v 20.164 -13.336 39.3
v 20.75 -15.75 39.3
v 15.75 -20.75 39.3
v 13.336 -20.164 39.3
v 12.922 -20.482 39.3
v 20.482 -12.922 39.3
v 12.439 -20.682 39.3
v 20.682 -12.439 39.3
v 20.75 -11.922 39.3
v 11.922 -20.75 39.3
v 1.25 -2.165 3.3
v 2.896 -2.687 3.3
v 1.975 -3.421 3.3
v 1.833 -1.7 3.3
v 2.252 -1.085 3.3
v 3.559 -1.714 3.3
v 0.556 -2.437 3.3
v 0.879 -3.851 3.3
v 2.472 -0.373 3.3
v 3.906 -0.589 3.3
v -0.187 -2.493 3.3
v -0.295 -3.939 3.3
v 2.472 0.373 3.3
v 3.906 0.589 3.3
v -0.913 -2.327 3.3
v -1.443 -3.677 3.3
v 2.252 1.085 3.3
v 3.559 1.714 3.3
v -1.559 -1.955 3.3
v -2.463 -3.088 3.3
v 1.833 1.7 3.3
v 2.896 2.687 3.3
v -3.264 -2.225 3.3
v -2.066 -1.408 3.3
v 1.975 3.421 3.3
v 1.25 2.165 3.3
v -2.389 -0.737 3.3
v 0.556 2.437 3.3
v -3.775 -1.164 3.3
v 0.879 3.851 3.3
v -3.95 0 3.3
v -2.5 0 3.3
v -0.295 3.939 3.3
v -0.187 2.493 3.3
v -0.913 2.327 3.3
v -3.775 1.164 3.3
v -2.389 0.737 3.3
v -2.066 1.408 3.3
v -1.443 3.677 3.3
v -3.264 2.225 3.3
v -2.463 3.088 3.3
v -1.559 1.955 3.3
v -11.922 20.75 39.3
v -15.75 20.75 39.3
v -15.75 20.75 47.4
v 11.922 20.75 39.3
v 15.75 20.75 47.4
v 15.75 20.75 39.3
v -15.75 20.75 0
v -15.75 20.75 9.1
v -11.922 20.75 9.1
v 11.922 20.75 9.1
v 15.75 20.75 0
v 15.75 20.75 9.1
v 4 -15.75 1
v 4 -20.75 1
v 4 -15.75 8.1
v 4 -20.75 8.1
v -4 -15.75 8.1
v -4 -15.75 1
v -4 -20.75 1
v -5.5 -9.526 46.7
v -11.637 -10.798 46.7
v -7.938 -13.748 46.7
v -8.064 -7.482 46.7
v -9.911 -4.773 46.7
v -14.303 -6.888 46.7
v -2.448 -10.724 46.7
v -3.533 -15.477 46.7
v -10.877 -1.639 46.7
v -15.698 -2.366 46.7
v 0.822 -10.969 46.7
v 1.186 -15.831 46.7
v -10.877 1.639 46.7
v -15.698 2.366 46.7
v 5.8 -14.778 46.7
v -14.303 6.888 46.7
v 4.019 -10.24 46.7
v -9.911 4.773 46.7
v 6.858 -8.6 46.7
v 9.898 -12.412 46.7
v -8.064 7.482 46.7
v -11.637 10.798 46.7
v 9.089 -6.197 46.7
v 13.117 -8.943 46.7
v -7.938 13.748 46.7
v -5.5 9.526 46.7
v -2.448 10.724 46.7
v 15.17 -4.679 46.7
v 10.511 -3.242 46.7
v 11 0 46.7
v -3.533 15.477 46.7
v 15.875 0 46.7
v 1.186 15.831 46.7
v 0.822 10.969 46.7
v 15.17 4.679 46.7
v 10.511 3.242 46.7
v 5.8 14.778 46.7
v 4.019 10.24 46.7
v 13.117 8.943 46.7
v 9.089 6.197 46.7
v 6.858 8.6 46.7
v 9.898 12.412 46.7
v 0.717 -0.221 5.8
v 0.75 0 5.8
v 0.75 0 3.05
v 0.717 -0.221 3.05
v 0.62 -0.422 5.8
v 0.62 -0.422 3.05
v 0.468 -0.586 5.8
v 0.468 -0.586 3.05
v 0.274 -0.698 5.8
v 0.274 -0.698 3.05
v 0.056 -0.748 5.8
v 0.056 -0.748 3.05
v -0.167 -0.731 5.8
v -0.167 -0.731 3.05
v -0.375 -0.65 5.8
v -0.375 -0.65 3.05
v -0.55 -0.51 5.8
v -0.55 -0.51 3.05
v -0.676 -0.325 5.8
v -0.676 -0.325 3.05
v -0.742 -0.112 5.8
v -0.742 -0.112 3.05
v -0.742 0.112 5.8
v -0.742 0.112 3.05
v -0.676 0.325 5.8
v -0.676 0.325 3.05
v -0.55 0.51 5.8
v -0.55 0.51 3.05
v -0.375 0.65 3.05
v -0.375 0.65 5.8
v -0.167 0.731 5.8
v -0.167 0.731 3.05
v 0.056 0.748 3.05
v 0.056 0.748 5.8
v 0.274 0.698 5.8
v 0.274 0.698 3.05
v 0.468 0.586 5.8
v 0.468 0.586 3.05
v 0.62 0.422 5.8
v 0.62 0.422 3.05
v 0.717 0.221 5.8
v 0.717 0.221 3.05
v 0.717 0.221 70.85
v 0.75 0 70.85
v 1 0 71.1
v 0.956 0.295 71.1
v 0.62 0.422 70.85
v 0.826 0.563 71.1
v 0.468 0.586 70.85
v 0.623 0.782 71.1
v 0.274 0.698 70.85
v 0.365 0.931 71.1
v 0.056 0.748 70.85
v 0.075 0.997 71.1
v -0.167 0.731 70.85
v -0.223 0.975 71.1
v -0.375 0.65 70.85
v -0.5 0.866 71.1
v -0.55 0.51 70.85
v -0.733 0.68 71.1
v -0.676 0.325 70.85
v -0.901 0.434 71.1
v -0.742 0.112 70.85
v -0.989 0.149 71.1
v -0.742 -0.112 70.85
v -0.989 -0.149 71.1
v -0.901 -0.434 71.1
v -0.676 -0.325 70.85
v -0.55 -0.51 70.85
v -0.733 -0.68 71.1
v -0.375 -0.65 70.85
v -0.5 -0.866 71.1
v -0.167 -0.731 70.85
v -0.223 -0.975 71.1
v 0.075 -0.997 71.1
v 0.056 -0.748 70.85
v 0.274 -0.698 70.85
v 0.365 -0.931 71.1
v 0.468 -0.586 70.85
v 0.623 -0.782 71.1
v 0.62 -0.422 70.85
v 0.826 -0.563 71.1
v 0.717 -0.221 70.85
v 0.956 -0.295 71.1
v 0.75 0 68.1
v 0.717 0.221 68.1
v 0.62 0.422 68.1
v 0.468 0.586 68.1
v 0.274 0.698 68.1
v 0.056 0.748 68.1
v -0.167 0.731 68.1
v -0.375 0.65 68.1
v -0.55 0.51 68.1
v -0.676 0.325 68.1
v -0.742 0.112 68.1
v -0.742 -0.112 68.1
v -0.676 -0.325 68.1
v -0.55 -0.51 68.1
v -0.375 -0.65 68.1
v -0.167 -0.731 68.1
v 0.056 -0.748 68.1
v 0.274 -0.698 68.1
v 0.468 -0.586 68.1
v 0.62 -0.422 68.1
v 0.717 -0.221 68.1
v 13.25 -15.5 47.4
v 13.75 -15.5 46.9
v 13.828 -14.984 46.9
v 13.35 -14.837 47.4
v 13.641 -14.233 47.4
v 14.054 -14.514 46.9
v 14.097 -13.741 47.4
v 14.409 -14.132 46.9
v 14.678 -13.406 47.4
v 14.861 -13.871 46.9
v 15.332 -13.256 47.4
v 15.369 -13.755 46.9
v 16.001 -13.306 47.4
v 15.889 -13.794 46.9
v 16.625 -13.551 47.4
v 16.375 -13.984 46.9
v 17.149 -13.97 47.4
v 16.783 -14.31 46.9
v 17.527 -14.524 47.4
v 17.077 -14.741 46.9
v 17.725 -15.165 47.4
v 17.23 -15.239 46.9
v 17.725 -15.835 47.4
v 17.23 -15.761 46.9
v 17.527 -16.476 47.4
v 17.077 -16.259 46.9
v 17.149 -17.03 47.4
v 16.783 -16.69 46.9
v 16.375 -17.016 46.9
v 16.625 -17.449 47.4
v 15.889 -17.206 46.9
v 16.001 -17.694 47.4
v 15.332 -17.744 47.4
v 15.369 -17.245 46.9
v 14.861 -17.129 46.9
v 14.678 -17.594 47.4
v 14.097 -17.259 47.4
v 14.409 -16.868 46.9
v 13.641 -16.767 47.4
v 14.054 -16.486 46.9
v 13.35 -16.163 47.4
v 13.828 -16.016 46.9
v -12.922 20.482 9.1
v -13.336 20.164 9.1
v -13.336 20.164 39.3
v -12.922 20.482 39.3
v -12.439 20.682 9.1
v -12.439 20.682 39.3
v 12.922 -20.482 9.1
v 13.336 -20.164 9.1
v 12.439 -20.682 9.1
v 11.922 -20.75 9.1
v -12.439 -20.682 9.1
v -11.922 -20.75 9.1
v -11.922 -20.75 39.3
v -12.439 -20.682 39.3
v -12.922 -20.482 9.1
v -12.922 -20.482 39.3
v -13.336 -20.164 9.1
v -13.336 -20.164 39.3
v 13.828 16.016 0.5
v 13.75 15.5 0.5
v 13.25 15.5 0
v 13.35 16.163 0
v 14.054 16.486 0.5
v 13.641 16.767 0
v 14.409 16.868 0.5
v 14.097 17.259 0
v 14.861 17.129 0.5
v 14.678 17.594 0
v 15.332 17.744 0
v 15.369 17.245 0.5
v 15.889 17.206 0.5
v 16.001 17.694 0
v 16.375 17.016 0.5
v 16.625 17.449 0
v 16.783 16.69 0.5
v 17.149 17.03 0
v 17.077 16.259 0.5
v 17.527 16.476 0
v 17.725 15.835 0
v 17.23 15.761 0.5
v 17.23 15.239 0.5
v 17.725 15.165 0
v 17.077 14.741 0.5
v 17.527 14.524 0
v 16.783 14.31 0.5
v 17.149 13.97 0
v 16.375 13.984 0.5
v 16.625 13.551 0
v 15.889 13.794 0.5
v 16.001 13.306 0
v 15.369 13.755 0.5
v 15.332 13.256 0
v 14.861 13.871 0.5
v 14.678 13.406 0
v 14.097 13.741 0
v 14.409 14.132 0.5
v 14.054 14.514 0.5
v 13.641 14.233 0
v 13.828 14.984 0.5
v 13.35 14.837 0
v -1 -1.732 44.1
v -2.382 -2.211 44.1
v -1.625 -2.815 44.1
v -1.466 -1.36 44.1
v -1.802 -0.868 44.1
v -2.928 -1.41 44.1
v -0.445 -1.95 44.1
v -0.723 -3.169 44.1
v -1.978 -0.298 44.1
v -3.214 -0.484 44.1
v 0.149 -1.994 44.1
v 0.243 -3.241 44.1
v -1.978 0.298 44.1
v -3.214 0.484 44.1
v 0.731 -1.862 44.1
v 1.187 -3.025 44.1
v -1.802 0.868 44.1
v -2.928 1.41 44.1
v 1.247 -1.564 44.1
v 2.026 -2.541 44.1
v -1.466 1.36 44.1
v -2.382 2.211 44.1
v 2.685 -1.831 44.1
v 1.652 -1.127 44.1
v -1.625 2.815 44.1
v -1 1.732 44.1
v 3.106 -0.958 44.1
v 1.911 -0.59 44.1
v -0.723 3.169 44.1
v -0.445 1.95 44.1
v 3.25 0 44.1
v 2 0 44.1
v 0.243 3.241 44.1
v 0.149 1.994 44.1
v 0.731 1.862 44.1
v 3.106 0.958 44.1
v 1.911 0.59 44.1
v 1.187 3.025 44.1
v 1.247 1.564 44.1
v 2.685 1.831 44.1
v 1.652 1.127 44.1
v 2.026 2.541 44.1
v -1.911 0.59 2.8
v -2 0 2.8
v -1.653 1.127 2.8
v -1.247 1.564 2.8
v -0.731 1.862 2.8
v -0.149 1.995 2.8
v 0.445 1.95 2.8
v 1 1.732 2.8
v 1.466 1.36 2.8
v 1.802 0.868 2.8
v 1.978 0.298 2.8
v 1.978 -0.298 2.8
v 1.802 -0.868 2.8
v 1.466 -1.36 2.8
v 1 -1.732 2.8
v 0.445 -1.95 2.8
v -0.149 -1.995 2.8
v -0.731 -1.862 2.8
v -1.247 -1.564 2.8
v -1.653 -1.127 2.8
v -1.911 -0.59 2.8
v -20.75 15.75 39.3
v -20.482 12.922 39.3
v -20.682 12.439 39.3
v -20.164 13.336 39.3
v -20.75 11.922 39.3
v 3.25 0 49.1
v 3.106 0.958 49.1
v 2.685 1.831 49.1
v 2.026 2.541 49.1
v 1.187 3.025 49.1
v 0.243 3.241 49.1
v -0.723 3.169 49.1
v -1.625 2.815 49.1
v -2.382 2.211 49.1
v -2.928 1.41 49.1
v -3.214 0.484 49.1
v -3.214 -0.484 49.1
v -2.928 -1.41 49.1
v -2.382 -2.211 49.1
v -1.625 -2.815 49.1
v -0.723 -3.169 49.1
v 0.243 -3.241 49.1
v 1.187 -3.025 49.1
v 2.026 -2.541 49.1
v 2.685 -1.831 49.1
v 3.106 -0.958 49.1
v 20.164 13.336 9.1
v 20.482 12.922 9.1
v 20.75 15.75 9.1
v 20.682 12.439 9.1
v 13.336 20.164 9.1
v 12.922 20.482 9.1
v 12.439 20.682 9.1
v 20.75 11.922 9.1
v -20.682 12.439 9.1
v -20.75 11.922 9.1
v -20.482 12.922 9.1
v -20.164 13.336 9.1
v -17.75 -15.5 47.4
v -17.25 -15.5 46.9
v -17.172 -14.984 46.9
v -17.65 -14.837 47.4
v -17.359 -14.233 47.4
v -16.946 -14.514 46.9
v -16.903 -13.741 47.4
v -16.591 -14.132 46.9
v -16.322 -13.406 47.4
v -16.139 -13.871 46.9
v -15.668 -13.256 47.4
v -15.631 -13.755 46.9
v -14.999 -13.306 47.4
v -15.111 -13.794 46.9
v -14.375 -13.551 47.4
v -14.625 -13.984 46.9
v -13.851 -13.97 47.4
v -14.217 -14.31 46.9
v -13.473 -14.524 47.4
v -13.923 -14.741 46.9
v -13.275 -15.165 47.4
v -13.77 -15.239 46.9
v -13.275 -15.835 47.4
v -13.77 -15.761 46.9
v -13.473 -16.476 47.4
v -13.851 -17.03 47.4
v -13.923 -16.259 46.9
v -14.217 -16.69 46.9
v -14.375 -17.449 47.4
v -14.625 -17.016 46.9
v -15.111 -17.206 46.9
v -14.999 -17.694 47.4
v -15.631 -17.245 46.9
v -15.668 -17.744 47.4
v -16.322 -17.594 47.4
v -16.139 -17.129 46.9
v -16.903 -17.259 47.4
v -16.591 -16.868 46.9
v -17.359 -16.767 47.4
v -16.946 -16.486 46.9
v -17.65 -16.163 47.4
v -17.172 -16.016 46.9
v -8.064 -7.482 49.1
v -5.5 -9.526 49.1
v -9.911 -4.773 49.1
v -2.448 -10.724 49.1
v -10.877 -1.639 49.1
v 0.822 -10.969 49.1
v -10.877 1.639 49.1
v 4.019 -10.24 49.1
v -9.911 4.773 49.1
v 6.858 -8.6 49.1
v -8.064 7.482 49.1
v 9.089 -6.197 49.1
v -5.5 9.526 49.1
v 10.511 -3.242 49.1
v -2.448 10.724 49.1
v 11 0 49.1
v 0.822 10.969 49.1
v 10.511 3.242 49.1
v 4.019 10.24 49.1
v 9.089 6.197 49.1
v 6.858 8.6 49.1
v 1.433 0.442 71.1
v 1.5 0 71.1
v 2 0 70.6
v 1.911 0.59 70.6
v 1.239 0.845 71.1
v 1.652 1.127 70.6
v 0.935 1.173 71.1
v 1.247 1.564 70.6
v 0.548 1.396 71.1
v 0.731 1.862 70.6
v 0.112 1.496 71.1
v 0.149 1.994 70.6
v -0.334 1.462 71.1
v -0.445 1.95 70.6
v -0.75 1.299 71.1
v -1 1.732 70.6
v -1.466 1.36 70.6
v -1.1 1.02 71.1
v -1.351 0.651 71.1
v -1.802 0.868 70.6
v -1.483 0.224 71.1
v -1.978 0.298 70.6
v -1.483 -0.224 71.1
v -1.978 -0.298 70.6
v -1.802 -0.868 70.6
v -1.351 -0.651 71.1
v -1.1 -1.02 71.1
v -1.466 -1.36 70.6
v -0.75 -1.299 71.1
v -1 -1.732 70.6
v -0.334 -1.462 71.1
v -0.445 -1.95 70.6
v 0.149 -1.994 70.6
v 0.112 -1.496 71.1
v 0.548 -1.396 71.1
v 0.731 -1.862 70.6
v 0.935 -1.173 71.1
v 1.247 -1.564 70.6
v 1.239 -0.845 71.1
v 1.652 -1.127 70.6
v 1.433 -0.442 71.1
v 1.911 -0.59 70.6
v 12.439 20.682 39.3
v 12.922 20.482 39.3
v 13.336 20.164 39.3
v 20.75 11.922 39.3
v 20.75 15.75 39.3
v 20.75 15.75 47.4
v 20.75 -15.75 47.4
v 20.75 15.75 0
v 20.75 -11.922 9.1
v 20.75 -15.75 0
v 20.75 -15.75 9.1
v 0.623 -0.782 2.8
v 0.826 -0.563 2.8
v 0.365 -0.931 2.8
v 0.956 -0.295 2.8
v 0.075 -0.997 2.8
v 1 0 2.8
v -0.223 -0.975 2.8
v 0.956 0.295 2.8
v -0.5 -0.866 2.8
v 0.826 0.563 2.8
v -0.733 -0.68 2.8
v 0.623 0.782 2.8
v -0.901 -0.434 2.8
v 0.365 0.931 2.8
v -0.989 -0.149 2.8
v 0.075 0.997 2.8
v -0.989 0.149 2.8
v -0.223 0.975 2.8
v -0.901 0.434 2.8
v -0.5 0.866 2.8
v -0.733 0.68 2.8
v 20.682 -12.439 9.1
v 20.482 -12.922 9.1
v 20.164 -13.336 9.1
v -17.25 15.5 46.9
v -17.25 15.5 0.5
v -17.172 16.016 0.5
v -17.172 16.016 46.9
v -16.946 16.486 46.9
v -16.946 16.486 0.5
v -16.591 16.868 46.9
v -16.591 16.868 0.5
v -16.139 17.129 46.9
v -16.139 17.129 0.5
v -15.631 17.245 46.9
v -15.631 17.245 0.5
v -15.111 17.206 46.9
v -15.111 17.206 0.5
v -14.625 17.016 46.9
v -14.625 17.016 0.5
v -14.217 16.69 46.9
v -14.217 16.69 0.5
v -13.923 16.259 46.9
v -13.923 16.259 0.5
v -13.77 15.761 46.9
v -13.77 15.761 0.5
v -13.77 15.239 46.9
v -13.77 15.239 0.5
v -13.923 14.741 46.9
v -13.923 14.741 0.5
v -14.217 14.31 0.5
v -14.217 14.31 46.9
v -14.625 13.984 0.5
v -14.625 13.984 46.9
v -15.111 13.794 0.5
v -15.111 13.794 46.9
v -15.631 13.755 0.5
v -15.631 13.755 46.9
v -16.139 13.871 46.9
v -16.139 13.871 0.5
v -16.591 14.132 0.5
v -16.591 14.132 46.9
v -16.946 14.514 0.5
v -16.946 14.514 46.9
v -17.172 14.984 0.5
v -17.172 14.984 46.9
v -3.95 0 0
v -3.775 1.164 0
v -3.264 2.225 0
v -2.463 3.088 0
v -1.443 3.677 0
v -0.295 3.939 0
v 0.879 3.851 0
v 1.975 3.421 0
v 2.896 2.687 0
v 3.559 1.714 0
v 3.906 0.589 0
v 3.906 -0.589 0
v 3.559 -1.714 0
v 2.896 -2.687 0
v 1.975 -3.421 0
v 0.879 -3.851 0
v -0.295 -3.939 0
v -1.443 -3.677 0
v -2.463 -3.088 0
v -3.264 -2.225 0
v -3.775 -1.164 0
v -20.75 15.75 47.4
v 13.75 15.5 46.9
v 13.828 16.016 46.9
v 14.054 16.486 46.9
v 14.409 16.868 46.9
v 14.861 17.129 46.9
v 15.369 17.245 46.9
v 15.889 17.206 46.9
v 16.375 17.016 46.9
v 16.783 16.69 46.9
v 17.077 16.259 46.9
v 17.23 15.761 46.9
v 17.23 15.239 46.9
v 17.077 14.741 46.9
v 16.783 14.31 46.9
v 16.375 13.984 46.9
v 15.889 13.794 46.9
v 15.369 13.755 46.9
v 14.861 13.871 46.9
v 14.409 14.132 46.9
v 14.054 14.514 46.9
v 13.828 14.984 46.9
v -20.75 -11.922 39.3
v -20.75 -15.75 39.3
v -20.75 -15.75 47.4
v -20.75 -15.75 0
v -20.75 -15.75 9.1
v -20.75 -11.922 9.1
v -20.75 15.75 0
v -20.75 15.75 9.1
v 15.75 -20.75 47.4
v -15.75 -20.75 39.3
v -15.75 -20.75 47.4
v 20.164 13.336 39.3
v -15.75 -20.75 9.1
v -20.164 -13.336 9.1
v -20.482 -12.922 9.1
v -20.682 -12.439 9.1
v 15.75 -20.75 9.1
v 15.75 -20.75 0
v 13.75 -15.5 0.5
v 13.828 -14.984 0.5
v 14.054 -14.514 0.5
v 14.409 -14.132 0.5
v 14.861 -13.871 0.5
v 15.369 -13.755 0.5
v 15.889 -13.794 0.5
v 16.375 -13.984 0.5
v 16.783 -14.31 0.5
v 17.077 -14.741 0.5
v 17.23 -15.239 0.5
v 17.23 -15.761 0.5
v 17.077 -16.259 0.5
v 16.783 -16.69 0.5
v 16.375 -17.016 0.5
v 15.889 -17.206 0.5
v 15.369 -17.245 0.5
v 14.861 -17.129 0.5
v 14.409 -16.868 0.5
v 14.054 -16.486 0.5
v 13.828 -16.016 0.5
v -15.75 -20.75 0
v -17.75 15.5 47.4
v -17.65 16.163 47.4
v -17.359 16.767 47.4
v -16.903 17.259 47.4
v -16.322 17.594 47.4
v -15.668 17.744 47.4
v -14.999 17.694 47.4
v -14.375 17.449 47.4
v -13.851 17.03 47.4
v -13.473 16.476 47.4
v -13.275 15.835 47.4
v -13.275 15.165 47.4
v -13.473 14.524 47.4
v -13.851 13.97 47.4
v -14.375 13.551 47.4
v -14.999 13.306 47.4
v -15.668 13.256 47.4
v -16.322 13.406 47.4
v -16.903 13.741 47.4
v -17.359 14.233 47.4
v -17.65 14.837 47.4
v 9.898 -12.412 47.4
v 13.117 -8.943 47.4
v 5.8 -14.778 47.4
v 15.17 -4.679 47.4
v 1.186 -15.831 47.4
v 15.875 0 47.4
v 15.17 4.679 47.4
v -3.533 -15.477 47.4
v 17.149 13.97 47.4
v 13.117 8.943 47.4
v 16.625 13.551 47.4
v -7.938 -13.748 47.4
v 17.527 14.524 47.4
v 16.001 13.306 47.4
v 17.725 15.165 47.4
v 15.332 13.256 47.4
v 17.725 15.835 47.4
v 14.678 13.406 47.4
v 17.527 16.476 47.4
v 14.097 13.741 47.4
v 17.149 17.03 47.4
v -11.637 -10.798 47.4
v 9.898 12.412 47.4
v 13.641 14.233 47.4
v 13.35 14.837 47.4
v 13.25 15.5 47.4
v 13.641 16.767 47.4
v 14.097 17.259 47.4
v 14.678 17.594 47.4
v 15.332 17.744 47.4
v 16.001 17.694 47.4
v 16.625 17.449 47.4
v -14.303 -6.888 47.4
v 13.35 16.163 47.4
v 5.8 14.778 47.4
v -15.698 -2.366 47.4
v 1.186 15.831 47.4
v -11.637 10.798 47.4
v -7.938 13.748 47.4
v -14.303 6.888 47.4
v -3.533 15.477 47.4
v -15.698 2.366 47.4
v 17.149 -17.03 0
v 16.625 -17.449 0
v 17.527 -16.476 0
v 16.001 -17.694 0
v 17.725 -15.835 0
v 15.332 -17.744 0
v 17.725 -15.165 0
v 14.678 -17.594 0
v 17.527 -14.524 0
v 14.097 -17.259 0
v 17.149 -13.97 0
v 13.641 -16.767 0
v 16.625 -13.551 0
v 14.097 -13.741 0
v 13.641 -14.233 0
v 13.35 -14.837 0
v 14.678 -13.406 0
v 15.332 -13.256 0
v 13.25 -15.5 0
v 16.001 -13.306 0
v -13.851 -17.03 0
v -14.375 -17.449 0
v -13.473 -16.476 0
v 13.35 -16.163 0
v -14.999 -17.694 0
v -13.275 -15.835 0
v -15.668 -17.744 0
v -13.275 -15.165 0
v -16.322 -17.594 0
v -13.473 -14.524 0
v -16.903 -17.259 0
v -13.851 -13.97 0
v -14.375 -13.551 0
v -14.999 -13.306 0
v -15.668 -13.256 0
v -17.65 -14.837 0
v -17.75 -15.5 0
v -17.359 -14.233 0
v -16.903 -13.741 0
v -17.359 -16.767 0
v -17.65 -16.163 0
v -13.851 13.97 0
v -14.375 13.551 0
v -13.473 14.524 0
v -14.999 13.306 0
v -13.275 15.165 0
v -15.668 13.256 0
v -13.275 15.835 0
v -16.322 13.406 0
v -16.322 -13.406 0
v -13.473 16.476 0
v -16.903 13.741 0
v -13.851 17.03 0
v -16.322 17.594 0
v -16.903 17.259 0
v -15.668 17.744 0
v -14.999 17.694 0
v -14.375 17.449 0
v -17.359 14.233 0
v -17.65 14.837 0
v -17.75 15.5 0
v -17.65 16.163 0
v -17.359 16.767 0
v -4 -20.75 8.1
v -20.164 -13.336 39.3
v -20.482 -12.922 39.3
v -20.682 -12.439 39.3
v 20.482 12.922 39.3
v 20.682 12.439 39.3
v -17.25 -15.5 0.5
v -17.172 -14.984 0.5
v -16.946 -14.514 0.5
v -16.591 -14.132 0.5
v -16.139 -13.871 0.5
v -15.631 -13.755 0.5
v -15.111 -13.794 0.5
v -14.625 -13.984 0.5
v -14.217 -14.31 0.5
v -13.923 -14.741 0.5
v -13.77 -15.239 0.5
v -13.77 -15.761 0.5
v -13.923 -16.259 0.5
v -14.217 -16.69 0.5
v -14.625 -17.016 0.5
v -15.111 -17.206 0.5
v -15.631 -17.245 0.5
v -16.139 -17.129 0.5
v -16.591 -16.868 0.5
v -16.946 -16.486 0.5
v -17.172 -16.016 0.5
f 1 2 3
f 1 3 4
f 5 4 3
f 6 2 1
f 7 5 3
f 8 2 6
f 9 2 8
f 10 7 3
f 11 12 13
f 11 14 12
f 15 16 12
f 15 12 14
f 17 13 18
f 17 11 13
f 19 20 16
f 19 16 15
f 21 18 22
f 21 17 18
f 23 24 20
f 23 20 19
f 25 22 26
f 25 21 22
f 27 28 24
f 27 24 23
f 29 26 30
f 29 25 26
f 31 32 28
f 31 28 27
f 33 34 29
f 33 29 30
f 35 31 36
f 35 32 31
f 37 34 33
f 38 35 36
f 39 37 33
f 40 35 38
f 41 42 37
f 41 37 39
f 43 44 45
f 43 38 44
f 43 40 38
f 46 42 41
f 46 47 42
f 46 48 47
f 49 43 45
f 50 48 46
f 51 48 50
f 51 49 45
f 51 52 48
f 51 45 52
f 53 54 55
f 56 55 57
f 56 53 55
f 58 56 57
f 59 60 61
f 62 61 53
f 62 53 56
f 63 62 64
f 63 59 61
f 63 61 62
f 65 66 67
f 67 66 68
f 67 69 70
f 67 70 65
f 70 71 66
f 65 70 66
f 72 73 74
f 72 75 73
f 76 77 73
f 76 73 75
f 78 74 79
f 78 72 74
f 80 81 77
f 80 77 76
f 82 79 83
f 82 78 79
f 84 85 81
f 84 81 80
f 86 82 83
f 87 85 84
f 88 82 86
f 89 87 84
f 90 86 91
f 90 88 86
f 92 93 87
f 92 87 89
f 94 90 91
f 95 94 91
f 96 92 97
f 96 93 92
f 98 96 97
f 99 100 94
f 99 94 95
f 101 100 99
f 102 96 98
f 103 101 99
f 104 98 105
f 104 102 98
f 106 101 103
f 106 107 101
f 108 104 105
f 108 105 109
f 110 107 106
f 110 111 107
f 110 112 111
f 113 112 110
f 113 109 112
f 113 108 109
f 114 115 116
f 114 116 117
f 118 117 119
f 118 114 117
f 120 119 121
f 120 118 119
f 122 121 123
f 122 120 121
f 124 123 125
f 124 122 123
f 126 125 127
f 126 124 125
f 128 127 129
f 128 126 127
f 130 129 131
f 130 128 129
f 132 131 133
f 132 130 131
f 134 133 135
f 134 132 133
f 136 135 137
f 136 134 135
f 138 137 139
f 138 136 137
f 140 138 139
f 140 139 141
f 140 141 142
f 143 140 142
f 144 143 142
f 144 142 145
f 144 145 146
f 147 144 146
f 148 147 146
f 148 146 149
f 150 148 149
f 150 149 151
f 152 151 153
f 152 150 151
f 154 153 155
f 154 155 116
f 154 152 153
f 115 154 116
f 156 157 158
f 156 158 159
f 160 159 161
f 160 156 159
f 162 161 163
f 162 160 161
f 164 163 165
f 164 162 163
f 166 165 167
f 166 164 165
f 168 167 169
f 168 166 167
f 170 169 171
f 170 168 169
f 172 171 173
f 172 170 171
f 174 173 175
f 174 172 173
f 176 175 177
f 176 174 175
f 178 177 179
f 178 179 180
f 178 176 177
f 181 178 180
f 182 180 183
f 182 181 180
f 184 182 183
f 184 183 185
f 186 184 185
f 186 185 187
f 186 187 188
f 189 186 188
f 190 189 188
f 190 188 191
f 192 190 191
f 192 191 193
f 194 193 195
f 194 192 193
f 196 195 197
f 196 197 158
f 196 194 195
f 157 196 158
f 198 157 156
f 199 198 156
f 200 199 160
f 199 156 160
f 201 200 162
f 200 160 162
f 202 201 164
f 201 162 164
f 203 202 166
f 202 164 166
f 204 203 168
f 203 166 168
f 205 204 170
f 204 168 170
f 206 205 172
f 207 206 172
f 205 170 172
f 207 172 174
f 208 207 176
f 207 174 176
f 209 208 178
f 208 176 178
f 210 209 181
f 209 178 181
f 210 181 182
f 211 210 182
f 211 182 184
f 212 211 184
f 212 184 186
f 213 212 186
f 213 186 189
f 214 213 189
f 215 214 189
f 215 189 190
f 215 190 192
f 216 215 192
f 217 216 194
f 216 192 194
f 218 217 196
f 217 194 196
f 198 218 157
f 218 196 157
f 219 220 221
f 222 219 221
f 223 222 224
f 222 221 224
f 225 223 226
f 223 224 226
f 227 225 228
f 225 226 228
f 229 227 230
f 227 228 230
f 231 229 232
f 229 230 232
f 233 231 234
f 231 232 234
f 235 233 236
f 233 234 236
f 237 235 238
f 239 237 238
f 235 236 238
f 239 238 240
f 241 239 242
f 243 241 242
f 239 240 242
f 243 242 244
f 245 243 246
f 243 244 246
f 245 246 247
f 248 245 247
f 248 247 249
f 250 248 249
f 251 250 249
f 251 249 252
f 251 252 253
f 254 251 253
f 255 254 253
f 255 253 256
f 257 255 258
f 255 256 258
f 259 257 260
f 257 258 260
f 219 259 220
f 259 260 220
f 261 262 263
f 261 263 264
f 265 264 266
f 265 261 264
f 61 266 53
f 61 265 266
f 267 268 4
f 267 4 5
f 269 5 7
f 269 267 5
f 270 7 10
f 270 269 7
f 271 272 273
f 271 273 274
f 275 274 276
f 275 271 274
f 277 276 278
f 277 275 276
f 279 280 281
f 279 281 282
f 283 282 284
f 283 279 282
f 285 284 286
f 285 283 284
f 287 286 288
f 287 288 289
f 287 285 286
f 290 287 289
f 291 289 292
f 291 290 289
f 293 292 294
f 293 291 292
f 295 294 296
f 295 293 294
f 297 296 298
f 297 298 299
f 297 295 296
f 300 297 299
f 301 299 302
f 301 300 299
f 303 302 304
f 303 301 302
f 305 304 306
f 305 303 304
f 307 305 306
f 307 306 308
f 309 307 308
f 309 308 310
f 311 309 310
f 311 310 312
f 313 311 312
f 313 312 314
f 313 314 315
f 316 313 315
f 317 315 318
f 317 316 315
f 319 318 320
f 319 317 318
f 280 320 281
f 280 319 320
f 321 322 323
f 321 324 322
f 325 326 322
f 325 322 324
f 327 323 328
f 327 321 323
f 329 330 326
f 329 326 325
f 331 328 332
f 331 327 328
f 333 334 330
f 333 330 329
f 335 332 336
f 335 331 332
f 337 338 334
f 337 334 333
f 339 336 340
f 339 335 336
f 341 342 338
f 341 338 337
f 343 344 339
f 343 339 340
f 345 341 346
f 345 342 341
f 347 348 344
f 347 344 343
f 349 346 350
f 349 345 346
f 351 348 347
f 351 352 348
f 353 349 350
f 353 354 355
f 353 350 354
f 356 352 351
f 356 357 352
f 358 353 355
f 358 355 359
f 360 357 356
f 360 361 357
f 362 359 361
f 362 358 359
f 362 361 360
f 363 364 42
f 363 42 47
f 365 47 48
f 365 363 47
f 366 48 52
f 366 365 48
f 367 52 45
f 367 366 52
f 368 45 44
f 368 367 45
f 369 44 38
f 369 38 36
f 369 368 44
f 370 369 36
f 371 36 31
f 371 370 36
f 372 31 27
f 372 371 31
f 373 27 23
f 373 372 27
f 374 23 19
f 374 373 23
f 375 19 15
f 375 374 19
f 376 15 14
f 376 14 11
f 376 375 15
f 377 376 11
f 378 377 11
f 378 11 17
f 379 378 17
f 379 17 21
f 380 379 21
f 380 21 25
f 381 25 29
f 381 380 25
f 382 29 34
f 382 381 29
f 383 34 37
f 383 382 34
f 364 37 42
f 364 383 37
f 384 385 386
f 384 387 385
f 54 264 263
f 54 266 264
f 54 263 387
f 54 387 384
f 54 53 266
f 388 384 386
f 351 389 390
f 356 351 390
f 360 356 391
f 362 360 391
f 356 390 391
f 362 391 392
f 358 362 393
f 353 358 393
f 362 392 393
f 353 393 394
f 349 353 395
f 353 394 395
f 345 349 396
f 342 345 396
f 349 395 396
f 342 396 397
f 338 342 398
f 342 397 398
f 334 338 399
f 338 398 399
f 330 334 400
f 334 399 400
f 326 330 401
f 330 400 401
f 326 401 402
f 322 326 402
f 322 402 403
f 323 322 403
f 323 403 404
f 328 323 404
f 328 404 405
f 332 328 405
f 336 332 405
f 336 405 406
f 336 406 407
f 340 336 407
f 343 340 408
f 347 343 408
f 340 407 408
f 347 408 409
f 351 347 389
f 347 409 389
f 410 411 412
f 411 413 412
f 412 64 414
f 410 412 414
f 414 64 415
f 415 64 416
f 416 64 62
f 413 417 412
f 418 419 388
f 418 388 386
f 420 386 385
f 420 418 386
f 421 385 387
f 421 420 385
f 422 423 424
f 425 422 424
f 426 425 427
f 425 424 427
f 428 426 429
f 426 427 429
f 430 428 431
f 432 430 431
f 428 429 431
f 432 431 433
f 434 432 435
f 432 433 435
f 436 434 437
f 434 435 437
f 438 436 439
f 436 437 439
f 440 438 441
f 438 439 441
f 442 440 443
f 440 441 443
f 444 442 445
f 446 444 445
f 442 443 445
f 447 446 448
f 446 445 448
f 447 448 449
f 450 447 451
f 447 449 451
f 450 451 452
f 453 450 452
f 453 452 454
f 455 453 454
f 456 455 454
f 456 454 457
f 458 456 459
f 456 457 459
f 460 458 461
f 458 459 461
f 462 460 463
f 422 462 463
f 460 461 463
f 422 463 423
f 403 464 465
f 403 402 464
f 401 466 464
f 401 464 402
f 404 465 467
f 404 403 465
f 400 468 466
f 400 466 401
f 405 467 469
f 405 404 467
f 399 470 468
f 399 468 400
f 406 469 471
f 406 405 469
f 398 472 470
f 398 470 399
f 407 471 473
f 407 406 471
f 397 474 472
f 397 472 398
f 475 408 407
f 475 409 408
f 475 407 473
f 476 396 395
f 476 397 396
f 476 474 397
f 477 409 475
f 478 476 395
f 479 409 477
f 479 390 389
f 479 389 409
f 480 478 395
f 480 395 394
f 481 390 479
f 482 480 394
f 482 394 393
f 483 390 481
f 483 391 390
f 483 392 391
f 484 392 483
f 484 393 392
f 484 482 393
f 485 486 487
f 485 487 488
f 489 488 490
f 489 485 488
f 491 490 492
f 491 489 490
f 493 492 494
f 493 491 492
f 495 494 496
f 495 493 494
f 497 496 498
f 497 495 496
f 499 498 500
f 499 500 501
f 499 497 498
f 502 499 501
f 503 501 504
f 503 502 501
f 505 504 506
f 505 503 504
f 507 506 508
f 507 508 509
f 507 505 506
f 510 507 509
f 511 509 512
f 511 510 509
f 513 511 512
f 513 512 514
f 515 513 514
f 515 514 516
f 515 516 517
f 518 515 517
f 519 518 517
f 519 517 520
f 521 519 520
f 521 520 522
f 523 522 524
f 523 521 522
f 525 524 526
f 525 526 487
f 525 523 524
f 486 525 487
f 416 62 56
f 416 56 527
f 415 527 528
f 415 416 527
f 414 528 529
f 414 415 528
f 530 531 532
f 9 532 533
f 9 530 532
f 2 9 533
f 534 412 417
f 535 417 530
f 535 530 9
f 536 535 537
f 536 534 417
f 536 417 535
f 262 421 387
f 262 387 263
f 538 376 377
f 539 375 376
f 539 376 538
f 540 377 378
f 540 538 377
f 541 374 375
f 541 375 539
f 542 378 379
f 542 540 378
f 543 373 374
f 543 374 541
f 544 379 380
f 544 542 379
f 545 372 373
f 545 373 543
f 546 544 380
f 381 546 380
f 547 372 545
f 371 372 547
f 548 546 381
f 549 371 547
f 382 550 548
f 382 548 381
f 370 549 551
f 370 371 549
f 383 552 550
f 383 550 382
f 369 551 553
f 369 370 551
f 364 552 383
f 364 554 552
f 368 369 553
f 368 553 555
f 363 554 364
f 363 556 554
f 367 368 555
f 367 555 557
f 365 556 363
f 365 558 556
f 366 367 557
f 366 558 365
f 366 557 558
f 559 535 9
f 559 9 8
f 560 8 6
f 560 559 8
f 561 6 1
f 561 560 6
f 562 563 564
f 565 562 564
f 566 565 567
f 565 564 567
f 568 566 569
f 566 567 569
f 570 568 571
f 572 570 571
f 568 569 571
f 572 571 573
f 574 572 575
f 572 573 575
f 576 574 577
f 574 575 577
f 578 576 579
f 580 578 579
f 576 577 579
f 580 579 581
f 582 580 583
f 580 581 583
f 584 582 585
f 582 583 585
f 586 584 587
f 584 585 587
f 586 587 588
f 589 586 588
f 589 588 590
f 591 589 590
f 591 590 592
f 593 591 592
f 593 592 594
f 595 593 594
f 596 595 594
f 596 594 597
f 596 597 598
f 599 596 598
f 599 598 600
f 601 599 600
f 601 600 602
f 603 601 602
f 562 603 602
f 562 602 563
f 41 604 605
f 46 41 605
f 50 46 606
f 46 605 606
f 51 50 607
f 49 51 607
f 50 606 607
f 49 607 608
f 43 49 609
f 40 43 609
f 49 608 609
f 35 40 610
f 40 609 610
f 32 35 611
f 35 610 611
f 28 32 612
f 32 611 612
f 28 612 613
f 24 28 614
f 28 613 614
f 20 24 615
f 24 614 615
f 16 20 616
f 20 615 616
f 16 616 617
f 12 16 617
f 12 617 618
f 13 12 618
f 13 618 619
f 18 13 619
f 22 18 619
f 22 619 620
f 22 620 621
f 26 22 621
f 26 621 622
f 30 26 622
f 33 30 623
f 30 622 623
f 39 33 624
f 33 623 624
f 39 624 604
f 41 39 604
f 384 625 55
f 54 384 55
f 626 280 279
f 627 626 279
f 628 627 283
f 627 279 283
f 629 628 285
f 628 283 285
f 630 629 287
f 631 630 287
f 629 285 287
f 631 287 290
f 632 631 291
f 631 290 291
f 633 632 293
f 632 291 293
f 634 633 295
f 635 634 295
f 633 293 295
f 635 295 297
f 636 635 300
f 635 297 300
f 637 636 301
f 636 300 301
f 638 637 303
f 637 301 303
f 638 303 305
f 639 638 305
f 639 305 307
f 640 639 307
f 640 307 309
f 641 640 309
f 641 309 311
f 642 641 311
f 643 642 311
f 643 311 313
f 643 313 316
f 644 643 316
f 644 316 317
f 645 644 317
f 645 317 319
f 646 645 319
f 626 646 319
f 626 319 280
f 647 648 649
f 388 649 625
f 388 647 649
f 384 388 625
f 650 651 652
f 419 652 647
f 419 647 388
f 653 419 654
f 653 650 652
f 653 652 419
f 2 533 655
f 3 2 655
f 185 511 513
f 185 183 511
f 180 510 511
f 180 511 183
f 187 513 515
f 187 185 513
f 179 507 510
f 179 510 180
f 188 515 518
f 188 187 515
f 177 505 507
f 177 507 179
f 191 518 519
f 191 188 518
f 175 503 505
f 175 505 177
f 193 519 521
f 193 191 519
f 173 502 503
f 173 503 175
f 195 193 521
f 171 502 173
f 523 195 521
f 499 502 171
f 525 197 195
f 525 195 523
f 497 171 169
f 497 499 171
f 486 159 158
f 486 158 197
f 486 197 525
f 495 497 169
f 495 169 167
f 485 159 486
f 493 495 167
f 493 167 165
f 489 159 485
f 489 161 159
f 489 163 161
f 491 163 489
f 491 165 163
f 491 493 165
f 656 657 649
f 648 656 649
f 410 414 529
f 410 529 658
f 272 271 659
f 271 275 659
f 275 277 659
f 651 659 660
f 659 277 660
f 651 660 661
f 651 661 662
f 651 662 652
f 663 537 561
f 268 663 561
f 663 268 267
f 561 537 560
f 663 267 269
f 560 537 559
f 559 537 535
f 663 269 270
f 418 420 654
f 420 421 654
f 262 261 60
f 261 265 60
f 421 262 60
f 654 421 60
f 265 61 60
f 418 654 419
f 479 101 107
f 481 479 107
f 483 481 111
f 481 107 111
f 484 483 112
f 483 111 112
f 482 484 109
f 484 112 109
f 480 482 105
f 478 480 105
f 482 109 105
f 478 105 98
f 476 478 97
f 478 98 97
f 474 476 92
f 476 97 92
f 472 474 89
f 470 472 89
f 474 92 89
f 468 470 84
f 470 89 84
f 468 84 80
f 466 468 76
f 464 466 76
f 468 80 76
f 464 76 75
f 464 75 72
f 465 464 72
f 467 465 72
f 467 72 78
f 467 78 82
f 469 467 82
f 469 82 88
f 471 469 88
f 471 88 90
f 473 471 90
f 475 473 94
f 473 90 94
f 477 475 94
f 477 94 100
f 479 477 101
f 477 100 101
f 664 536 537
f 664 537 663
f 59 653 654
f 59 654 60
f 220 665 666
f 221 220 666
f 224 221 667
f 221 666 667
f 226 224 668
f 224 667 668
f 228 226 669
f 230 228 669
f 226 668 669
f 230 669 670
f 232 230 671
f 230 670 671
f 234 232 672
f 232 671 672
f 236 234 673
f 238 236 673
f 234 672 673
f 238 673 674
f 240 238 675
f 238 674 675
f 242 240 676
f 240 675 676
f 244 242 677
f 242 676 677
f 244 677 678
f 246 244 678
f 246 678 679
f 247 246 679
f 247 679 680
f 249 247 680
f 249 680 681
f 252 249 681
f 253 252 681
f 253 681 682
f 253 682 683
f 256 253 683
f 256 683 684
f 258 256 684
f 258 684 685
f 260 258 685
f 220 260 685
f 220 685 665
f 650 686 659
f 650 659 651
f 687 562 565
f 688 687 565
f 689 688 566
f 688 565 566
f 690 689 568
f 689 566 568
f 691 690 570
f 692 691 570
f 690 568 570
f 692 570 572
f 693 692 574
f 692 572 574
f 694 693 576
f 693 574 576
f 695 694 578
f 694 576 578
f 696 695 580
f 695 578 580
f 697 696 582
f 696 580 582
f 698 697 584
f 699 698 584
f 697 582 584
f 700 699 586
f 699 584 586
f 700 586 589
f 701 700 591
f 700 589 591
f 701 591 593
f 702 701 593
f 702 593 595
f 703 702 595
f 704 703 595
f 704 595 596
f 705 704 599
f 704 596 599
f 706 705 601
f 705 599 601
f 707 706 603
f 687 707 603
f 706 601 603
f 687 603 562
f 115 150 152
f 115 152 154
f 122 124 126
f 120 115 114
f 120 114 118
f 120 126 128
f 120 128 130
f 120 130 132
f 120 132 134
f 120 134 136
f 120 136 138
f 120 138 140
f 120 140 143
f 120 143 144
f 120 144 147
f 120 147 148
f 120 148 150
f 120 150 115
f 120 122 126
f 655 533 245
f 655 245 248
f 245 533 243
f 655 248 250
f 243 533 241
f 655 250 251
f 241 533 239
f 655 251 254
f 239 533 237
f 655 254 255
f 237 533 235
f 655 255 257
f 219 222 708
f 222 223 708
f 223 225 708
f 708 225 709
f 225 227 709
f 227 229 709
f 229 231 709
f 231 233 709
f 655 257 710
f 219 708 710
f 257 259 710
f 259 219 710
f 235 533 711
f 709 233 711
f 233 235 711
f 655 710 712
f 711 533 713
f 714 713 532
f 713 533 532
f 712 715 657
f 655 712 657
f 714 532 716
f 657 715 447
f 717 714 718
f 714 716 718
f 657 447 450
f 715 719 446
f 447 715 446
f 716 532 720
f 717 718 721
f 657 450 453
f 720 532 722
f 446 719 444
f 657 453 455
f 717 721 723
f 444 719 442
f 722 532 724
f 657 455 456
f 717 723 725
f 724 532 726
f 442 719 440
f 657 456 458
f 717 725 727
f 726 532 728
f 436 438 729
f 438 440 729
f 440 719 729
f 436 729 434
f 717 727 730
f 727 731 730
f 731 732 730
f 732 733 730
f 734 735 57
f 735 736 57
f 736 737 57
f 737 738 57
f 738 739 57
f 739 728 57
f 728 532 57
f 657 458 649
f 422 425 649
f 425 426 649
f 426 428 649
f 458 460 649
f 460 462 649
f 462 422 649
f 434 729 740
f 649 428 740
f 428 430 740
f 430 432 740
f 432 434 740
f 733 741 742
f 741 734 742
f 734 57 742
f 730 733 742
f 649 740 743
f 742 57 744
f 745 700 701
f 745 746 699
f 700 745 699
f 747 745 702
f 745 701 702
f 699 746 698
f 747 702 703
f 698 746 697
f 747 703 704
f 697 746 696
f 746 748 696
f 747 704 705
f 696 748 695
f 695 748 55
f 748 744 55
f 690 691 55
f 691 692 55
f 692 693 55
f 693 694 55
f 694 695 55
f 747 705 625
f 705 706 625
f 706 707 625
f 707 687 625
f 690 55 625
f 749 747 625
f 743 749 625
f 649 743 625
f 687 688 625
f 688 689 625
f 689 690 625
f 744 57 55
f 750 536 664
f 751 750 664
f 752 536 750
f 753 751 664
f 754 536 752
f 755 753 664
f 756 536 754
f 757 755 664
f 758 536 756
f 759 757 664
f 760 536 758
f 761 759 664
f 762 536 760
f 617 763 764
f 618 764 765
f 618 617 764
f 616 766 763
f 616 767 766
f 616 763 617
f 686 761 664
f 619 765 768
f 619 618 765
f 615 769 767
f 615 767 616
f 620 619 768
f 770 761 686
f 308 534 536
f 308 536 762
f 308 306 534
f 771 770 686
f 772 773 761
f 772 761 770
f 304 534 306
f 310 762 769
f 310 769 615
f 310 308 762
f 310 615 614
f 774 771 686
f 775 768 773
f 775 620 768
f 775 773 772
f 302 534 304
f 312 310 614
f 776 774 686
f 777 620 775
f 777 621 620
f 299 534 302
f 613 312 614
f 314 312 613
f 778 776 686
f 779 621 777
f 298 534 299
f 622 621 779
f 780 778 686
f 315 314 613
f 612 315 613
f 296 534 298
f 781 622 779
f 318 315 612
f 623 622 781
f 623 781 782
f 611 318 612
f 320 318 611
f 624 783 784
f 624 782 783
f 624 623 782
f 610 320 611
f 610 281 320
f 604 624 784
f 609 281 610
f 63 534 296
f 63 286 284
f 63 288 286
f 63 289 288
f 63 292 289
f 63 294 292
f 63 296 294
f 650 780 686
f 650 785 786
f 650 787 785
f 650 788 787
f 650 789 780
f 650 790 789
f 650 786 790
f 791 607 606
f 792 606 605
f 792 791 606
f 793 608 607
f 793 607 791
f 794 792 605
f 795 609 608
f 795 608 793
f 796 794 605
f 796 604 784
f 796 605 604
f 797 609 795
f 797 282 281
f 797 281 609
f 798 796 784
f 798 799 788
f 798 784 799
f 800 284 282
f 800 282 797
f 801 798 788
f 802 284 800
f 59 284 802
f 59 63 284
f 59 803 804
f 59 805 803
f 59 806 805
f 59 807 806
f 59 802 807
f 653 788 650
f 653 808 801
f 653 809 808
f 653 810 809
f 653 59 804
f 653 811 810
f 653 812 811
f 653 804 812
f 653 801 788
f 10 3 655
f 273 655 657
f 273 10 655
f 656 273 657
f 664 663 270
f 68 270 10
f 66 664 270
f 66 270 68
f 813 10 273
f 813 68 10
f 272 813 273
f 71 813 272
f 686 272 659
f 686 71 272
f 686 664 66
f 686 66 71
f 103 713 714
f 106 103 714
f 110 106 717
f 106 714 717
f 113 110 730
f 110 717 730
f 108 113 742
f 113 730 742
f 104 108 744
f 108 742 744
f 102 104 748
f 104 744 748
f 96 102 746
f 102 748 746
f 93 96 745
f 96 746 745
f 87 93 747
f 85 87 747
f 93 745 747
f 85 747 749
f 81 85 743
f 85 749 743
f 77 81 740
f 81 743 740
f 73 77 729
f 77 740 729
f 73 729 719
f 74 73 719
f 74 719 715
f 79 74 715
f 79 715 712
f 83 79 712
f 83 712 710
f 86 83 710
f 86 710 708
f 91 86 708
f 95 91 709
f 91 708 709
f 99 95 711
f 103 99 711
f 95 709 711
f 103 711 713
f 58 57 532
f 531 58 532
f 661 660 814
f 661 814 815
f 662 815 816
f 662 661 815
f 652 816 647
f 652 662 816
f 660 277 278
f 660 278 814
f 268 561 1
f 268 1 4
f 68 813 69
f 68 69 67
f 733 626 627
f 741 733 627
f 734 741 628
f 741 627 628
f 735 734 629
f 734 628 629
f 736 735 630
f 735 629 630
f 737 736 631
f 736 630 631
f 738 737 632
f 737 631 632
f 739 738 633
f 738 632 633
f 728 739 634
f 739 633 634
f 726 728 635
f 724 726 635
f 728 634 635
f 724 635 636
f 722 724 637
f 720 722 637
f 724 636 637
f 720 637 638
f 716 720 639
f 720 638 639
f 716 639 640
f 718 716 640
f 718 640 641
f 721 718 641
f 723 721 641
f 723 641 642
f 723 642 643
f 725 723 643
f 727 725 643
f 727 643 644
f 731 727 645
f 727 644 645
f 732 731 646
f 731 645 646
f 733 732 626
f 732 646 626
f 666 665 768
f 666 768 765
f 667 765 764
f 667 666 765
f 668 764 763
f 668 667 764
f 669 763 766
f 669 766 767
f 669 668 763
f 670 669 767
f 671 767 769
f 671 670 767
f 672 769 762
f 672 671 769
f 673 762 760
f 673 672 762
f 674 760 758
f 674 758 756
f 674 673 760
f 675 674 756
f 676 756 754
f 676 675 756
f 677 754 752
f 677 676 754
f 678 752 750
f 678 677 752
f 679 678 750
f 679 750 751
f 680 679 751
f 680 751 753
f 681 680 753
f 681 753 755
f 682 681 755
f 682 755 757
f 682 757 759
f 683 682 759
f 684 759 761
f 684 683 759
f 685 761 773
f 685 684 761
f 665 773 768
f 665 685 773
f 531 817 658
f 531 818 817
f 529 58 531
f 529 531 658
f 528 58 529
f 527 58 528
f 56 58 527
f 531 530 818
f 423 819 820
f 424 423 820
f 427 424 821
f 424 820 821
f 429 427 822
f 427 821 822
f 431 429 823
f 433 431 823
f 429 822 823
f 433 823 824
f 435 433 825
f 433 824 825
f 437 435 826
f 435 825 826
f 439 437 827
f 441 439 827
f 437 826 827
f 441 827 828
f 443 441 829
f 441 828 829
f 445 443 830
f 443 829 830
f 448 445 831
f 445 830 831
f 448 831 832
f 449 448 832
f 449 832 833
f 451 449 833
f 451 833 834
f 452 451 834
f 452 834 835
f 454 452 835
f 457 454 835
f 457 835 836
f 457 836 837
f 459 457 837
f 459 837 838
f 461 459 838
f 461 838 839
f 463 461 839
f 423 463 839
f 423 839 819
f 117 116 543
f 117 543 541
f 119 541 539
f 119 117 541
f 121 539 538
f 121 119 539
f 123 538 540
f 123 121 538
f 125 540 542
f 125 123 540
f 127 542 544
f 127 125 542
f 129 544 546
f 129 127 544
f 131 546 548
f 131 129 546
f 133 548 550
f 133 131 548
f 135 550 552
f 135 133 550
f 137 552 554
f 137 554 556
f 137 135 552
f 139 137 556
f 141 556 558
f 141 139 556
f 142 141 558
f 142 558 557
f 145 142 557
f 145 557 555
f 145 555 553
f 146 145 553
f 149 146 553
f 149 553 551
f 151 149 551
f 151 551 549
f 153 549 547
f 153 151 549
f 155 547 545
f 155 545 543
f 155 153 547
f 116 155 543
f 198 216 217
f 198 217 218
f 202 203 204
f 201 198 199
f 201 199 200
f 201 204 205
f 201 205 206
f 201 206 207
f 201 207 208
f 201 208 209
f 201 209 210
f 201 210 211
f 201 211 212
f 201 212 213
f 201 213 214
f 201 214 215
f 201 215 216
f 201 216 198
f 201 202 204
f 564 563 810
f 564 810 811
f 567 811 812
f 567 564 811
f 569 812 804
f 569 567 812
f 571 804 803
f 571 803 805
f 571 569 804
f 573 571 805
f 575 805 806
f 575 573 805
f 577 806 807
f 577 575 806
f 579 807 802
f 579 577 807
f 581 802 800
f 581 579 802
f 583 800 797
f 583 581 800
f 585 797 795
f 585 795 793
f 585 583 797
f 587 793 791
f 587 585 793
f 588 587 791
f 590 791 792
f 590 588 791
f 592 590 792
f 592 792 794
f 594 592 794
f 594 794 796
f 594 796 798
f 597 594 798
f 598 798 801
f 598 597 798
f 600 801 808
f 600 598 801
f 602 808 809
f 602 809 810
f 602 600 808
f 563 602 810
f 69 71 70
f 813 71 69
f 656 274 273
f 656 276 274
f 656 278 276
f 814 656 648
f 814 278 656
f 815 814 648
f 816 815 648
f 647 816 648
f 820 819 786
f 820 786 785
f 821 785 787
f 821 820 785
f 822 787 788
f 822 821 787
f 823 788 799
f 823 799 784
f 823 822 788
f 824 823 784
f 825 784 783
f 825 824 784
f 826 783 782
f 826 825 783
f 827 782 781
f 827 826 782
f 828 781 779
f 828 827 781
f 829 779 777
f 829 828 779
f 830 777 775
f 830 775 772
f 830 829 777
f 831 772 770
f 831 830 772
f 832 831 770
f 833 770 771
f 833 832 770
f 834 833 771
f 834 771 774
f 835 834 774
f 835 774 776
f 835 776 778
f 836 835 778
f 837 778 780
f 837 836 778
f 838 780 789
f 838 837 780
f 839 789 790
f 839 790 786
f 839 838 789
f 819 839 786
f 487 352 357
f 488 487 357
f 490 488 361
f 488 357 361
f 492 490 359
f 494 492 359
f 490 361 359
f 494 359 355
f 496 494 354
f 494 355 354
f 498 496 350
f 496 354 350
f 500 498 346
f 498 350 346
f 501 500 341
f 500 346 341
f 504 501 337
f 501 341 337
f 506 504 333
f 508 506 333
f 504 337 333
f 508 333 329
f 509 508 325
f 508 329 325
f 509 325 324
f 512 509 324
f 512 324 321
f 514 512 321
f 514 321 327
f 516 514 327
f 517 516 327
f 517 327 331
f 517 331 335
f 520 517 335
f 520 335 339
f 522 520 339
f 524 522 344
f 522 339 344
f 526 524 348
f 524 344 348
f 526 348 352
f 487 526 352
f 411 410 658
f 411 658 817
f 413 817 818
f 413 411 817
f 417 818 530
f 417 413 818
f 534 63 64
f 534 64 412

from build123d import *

# Parameters (mm, degrees)
BOSS_EXTRUDE1_DEPTH = 9.1
BOSS_EXTRUDE2_DEPTH = 30.2
BOSS_EXTRUDE3_DEPTH = 8.1
SKETCH4_R           = 15.875
CUT_EXTRUDE1_DEPTH  = 0.7
SKETCH5_R           = 11
BOSS_EXTRUDE4_DEPTH = 2.4
SKETCH6_R           = 1.75
CUT_EXTRUDE2_DEPTH  = 58.200830414
CHAMFER1_SIZE       = 0.5
SKETCH7_R           = 3.95
CUT_EXTRUDE3_DEPTH  = 3.3
SKETCH8_R           = 3.25
CUT_EXTRUDE4_DEPTH  = 5
SKETCH9_R           = 2
BOSS_EXTRUDE5_DEPTH = 27
CHAMFER2_SIZE       = 0.5
SKETCH10_R          = 0.75
CUT_EXTRUDE5_DEPTH  = 3
CHAMFER3_SIZE       = 0.25
SKETCH11_R          = 2.5
BOSS_EXTRUDE6_DEPTH = 0.5
CHAMFER4_SIZE       = 0.5
CUT_EXTRUDE6_START  = -3
SKETCH12_R          = 0.75
CUT_EXTRUDE6_DEPTH  = 3
CHAMFER5_SIZE       = 0.25
SKETCH14_W          = 8
SKETCH14_H          = 7.1
CUT_EXTRUDE8_DEPTH  = 5


with BuildPart() as part:
    # Sketch1 → Boss-Extrude1 (new body)
    with BuildSketch(Plane.XY):
        Polygon((15.75, 20.75), (20.75, 15.75), (20.75, -15.75), (15.75, -20.75), (-15.75, -20.75), (-20.75, -15.75), (-20.75, 15.75), (-15.75, 20.75), align=None)
    extrude(amount=BOSS_EXTRUDE1_DEPTH)

    # Sketch2 → Boss-Extrude2 (add)
    with BuildSketch(Plane.XY.offset(9.1)):
        with BuildLine():
            Line((13.335786438, 20.164213562), (20.164213562, 13.335786438))
            ThreePointArc((20.164213562, 13.335786438), (20.597759065, 12.68693974), (20.75, 11.921572875))
            Line((20.75, 11.921572875), (20.75, -11.921572875))
            ThreePointArc((20.75, -11.921572875), (20.597759065, -12.68693974), (20.164213562, -13.335786438))
            Line((20.164213562, -13.335786438), (13.335786438, -20.164213562))
            ThreePointArc((13.335786438, -20.164213562), (12.68693974, -20.597759065), (11.921572875, -20.75))
            Line((11.921572875, -20.75), (-11.921572875, -20.75))
            ThreePointArc((-11.921572875, -20.75), (-12.68693974, -20.597759065), (-13.335786438, -20.164213562))
            Line((-13.335786438, -20.164213562), (-20.164213562, -13.335786438))
            ThreePointArc((-20.164213562, -13.335786438), (-20.597759065, -12.68693974), (-20.75, -11.921572875))
            Line((-20.75, -11.921572875), (-20.75, 11.921572875))
            ThreePointArc((-20.75, 11.921572875), (-20.597759065, 12.68693974), (-20.164213562, 13.335786438))
            Line((-20.164213562, 13.335786438), (-13.335786438, 20.164213562))
            ThreePointArc((-13.335786438, 20.164213562), (-12.68693974, 20.597759065), (-11.921572875, 20.75))
            Line((-11.921572875, 20.75), (11.921572875, 20.75))
            ThreePointArc((11.921572875, 20.75), (12.68693974, 20.597759065), (13.335786438, 20.164213562))
        make_face()
    extrude(amount=BOSS_EXTRUDE2_DEPTH)

    # Sketch3 → Boss-Extrude3 (add)
    with BuildSketch(Plane.XY.offset(39.3)):
        Polygon((15.75, 20.75), (20.75, 15.75), (20.75, -15.75), (15.75, -20.75), (-15.75, -20.75), (-20.75, -15.75), (-20.75, 15.75), (-15.75, 20.75), align=None)
    extrude(amount=BOSS_EXTRUDE3_DEPTH)

    # Sketch4 → Cut-Extrude1 (cut)
    with BuildSketch(Plane.XY.offset(47.4)):
        Circle(SKETCH4_R)
    extrude(amount=-CUT_EXTRUDE1_DEPTH, mode=Mode.SUBTRACT)

    # Sketch5 → Boss-Extrude4 (add)
    with BuildSketch(Plane.XY.offset(46.7)):
        Circle(SKETCH5_R)
    extrude(amount=BOSS_EXTRUDE4_DEPTH)

    # Sketch6 → Cut-Extrude2 (cut, through all)
    with BuildSketch(Plane(origin=(0, 0, 0), x_dir=(-1, 0, 0), z_dir=(0, 0, -1))):
        with Locations((-15.5, 15.5)):
            Circle(SKETCH6_R)
        with Locations((-15.5, -15.5)):
            Circle(SKETCH6_R)
        with Locations((15.5, -15.5)):
            Circle(SKETCH6_R)
        with Locations((15.5, 15.5)):
            Circle(SKETCH6_R)
    extrude(amount=-CUT_EXTRUDE2_DEPTH, mode=Mode.SUBTRACT)

    # Chamfer1
    chamfer1_edges = [part.edges().sort_by_distance(p)[0] for p in [
        (17.25, 15.5, 47.4),
        (17.25, 15.5, 0),
        (17.25, -15.5, 47.4),
        (17.25, -15.5, 0),
        (-13.75, -15.5, 47.4),
        (-13.75, -15.5, 0),
        (-13.75, 15.5, 47.4),
        (-13.75, 15.5, 0),
    ]]
    chamfer(chamfer1_edges, length=CHAMFER1_SIZE)

    # Sketch7 → Cut-Extrude3 (cut)
    with BuildSketch(Plane(origin=(0, 0, 0), x_dir=(-1, 0, 0), z_dir=(0, 0, -1))):
        Circle(SKETCH7_R)
    extrude(amount=-CUT_EXTRUDE3_DEPTH, mode=Mode.SUBTRACT)

    # Sketch8 → Cut-Extrude4 (cut)
    with BuildSketch(Plane.XY.offset(49.1)):
        Circle(SKETCH8_R)
    extrude(amount=-CUT_EXTRUDE4_DEPTH, mode=Mode.SUBTRACT)

    # Sketch9 → Boss-Extrude5 (add)
    with BuildSketch(Plane.XY.offset(44.1)):
        Circle(SKETCH9_R)
    extrude(amount=BOSS_EXTRUDE5_DEPTH)

    # Chamfer2
    chamfer2_edges = [part.edges().sort_by_distance(p)[0] for p in [
        (-2, 0, 71.1),
    ]]
    chamfer(chamfer2_edges, length=CHAMFER2_SIZE)

    # Sketch10 → Cut-Extrude5 (cut)
    with BuildSketch(Plane.XY.offset(71.1)):
        Circle(SKETCH10_R)
    extrude(amount=-CUT_EXTRUDE5_DEPTH, mode=Mode.SUBTRACT)

    # Chamfer3
    chamfer3_edges = [part.edges().sort_by_distance(p)[0] for p in [
        (-0.75, 0, 71.1),
    ]]
    chamfer(chamfer3_edges, length=CHAMFER3_SIZE)

    # Sketch11 → Boss-Extrude6 (add)
    with BuildSketch(Plane(origin=(0, 0, 3.3), x_dir=(-1, 0, 0), z_dir=(0, 0, -1))):
        Circle(SKETCH11_R)
    extrude(amount=BOSS_EXTRUDE6_DEPTH)

    # Chamfer4
    chamfer4_edges = [part.edges().sort_by_distance(p)[0] for p in [
        (2.5, 0, 2.8),
    ]]
    chamfer(chamfer4_edges, length=CHAMFER4_SIZE - 0.0001)  # a hair under: the kernel refuses the full size

    # Sketch12 → Cut-Extrude6 (cut)
    with BuildSketch(Plane(origin=(0, 0, 2.8), x_dir=(-1, 0, 0), z_dir=(0, 0, -1)).offset(CUT_EXTRUDE6_START)):
        with Locations(Location((0, 0, 0), (0, 0, 180))):
            Circle(SKETCH12_R)
    extrude(amount=CUT_EXTRUDE6_DEPTH, mode=Mode.SUBTRACT)

    # Chamfer5
    chamfer5_edges = [part.edges().sort_by_distance(p)[0] for p in [
        (-0.75, 0, 2.8),
    ]]
    chamfer(chamfer5_edges, length=CHAMFER5_SIZE)

    # Sketch14 → Cut-Extrude8 (cut)
    with BuildSketch(Plane.XZ.offset(20.75)):
        with Locations((0, 4.55)):
            Rectangle(SKETCH14_W, SKETCH14_H)
    extrude(amount=-CUT_EXTRUDE8_DEPTH, mode=Mode.SUBTRACT)


solid = part.part
